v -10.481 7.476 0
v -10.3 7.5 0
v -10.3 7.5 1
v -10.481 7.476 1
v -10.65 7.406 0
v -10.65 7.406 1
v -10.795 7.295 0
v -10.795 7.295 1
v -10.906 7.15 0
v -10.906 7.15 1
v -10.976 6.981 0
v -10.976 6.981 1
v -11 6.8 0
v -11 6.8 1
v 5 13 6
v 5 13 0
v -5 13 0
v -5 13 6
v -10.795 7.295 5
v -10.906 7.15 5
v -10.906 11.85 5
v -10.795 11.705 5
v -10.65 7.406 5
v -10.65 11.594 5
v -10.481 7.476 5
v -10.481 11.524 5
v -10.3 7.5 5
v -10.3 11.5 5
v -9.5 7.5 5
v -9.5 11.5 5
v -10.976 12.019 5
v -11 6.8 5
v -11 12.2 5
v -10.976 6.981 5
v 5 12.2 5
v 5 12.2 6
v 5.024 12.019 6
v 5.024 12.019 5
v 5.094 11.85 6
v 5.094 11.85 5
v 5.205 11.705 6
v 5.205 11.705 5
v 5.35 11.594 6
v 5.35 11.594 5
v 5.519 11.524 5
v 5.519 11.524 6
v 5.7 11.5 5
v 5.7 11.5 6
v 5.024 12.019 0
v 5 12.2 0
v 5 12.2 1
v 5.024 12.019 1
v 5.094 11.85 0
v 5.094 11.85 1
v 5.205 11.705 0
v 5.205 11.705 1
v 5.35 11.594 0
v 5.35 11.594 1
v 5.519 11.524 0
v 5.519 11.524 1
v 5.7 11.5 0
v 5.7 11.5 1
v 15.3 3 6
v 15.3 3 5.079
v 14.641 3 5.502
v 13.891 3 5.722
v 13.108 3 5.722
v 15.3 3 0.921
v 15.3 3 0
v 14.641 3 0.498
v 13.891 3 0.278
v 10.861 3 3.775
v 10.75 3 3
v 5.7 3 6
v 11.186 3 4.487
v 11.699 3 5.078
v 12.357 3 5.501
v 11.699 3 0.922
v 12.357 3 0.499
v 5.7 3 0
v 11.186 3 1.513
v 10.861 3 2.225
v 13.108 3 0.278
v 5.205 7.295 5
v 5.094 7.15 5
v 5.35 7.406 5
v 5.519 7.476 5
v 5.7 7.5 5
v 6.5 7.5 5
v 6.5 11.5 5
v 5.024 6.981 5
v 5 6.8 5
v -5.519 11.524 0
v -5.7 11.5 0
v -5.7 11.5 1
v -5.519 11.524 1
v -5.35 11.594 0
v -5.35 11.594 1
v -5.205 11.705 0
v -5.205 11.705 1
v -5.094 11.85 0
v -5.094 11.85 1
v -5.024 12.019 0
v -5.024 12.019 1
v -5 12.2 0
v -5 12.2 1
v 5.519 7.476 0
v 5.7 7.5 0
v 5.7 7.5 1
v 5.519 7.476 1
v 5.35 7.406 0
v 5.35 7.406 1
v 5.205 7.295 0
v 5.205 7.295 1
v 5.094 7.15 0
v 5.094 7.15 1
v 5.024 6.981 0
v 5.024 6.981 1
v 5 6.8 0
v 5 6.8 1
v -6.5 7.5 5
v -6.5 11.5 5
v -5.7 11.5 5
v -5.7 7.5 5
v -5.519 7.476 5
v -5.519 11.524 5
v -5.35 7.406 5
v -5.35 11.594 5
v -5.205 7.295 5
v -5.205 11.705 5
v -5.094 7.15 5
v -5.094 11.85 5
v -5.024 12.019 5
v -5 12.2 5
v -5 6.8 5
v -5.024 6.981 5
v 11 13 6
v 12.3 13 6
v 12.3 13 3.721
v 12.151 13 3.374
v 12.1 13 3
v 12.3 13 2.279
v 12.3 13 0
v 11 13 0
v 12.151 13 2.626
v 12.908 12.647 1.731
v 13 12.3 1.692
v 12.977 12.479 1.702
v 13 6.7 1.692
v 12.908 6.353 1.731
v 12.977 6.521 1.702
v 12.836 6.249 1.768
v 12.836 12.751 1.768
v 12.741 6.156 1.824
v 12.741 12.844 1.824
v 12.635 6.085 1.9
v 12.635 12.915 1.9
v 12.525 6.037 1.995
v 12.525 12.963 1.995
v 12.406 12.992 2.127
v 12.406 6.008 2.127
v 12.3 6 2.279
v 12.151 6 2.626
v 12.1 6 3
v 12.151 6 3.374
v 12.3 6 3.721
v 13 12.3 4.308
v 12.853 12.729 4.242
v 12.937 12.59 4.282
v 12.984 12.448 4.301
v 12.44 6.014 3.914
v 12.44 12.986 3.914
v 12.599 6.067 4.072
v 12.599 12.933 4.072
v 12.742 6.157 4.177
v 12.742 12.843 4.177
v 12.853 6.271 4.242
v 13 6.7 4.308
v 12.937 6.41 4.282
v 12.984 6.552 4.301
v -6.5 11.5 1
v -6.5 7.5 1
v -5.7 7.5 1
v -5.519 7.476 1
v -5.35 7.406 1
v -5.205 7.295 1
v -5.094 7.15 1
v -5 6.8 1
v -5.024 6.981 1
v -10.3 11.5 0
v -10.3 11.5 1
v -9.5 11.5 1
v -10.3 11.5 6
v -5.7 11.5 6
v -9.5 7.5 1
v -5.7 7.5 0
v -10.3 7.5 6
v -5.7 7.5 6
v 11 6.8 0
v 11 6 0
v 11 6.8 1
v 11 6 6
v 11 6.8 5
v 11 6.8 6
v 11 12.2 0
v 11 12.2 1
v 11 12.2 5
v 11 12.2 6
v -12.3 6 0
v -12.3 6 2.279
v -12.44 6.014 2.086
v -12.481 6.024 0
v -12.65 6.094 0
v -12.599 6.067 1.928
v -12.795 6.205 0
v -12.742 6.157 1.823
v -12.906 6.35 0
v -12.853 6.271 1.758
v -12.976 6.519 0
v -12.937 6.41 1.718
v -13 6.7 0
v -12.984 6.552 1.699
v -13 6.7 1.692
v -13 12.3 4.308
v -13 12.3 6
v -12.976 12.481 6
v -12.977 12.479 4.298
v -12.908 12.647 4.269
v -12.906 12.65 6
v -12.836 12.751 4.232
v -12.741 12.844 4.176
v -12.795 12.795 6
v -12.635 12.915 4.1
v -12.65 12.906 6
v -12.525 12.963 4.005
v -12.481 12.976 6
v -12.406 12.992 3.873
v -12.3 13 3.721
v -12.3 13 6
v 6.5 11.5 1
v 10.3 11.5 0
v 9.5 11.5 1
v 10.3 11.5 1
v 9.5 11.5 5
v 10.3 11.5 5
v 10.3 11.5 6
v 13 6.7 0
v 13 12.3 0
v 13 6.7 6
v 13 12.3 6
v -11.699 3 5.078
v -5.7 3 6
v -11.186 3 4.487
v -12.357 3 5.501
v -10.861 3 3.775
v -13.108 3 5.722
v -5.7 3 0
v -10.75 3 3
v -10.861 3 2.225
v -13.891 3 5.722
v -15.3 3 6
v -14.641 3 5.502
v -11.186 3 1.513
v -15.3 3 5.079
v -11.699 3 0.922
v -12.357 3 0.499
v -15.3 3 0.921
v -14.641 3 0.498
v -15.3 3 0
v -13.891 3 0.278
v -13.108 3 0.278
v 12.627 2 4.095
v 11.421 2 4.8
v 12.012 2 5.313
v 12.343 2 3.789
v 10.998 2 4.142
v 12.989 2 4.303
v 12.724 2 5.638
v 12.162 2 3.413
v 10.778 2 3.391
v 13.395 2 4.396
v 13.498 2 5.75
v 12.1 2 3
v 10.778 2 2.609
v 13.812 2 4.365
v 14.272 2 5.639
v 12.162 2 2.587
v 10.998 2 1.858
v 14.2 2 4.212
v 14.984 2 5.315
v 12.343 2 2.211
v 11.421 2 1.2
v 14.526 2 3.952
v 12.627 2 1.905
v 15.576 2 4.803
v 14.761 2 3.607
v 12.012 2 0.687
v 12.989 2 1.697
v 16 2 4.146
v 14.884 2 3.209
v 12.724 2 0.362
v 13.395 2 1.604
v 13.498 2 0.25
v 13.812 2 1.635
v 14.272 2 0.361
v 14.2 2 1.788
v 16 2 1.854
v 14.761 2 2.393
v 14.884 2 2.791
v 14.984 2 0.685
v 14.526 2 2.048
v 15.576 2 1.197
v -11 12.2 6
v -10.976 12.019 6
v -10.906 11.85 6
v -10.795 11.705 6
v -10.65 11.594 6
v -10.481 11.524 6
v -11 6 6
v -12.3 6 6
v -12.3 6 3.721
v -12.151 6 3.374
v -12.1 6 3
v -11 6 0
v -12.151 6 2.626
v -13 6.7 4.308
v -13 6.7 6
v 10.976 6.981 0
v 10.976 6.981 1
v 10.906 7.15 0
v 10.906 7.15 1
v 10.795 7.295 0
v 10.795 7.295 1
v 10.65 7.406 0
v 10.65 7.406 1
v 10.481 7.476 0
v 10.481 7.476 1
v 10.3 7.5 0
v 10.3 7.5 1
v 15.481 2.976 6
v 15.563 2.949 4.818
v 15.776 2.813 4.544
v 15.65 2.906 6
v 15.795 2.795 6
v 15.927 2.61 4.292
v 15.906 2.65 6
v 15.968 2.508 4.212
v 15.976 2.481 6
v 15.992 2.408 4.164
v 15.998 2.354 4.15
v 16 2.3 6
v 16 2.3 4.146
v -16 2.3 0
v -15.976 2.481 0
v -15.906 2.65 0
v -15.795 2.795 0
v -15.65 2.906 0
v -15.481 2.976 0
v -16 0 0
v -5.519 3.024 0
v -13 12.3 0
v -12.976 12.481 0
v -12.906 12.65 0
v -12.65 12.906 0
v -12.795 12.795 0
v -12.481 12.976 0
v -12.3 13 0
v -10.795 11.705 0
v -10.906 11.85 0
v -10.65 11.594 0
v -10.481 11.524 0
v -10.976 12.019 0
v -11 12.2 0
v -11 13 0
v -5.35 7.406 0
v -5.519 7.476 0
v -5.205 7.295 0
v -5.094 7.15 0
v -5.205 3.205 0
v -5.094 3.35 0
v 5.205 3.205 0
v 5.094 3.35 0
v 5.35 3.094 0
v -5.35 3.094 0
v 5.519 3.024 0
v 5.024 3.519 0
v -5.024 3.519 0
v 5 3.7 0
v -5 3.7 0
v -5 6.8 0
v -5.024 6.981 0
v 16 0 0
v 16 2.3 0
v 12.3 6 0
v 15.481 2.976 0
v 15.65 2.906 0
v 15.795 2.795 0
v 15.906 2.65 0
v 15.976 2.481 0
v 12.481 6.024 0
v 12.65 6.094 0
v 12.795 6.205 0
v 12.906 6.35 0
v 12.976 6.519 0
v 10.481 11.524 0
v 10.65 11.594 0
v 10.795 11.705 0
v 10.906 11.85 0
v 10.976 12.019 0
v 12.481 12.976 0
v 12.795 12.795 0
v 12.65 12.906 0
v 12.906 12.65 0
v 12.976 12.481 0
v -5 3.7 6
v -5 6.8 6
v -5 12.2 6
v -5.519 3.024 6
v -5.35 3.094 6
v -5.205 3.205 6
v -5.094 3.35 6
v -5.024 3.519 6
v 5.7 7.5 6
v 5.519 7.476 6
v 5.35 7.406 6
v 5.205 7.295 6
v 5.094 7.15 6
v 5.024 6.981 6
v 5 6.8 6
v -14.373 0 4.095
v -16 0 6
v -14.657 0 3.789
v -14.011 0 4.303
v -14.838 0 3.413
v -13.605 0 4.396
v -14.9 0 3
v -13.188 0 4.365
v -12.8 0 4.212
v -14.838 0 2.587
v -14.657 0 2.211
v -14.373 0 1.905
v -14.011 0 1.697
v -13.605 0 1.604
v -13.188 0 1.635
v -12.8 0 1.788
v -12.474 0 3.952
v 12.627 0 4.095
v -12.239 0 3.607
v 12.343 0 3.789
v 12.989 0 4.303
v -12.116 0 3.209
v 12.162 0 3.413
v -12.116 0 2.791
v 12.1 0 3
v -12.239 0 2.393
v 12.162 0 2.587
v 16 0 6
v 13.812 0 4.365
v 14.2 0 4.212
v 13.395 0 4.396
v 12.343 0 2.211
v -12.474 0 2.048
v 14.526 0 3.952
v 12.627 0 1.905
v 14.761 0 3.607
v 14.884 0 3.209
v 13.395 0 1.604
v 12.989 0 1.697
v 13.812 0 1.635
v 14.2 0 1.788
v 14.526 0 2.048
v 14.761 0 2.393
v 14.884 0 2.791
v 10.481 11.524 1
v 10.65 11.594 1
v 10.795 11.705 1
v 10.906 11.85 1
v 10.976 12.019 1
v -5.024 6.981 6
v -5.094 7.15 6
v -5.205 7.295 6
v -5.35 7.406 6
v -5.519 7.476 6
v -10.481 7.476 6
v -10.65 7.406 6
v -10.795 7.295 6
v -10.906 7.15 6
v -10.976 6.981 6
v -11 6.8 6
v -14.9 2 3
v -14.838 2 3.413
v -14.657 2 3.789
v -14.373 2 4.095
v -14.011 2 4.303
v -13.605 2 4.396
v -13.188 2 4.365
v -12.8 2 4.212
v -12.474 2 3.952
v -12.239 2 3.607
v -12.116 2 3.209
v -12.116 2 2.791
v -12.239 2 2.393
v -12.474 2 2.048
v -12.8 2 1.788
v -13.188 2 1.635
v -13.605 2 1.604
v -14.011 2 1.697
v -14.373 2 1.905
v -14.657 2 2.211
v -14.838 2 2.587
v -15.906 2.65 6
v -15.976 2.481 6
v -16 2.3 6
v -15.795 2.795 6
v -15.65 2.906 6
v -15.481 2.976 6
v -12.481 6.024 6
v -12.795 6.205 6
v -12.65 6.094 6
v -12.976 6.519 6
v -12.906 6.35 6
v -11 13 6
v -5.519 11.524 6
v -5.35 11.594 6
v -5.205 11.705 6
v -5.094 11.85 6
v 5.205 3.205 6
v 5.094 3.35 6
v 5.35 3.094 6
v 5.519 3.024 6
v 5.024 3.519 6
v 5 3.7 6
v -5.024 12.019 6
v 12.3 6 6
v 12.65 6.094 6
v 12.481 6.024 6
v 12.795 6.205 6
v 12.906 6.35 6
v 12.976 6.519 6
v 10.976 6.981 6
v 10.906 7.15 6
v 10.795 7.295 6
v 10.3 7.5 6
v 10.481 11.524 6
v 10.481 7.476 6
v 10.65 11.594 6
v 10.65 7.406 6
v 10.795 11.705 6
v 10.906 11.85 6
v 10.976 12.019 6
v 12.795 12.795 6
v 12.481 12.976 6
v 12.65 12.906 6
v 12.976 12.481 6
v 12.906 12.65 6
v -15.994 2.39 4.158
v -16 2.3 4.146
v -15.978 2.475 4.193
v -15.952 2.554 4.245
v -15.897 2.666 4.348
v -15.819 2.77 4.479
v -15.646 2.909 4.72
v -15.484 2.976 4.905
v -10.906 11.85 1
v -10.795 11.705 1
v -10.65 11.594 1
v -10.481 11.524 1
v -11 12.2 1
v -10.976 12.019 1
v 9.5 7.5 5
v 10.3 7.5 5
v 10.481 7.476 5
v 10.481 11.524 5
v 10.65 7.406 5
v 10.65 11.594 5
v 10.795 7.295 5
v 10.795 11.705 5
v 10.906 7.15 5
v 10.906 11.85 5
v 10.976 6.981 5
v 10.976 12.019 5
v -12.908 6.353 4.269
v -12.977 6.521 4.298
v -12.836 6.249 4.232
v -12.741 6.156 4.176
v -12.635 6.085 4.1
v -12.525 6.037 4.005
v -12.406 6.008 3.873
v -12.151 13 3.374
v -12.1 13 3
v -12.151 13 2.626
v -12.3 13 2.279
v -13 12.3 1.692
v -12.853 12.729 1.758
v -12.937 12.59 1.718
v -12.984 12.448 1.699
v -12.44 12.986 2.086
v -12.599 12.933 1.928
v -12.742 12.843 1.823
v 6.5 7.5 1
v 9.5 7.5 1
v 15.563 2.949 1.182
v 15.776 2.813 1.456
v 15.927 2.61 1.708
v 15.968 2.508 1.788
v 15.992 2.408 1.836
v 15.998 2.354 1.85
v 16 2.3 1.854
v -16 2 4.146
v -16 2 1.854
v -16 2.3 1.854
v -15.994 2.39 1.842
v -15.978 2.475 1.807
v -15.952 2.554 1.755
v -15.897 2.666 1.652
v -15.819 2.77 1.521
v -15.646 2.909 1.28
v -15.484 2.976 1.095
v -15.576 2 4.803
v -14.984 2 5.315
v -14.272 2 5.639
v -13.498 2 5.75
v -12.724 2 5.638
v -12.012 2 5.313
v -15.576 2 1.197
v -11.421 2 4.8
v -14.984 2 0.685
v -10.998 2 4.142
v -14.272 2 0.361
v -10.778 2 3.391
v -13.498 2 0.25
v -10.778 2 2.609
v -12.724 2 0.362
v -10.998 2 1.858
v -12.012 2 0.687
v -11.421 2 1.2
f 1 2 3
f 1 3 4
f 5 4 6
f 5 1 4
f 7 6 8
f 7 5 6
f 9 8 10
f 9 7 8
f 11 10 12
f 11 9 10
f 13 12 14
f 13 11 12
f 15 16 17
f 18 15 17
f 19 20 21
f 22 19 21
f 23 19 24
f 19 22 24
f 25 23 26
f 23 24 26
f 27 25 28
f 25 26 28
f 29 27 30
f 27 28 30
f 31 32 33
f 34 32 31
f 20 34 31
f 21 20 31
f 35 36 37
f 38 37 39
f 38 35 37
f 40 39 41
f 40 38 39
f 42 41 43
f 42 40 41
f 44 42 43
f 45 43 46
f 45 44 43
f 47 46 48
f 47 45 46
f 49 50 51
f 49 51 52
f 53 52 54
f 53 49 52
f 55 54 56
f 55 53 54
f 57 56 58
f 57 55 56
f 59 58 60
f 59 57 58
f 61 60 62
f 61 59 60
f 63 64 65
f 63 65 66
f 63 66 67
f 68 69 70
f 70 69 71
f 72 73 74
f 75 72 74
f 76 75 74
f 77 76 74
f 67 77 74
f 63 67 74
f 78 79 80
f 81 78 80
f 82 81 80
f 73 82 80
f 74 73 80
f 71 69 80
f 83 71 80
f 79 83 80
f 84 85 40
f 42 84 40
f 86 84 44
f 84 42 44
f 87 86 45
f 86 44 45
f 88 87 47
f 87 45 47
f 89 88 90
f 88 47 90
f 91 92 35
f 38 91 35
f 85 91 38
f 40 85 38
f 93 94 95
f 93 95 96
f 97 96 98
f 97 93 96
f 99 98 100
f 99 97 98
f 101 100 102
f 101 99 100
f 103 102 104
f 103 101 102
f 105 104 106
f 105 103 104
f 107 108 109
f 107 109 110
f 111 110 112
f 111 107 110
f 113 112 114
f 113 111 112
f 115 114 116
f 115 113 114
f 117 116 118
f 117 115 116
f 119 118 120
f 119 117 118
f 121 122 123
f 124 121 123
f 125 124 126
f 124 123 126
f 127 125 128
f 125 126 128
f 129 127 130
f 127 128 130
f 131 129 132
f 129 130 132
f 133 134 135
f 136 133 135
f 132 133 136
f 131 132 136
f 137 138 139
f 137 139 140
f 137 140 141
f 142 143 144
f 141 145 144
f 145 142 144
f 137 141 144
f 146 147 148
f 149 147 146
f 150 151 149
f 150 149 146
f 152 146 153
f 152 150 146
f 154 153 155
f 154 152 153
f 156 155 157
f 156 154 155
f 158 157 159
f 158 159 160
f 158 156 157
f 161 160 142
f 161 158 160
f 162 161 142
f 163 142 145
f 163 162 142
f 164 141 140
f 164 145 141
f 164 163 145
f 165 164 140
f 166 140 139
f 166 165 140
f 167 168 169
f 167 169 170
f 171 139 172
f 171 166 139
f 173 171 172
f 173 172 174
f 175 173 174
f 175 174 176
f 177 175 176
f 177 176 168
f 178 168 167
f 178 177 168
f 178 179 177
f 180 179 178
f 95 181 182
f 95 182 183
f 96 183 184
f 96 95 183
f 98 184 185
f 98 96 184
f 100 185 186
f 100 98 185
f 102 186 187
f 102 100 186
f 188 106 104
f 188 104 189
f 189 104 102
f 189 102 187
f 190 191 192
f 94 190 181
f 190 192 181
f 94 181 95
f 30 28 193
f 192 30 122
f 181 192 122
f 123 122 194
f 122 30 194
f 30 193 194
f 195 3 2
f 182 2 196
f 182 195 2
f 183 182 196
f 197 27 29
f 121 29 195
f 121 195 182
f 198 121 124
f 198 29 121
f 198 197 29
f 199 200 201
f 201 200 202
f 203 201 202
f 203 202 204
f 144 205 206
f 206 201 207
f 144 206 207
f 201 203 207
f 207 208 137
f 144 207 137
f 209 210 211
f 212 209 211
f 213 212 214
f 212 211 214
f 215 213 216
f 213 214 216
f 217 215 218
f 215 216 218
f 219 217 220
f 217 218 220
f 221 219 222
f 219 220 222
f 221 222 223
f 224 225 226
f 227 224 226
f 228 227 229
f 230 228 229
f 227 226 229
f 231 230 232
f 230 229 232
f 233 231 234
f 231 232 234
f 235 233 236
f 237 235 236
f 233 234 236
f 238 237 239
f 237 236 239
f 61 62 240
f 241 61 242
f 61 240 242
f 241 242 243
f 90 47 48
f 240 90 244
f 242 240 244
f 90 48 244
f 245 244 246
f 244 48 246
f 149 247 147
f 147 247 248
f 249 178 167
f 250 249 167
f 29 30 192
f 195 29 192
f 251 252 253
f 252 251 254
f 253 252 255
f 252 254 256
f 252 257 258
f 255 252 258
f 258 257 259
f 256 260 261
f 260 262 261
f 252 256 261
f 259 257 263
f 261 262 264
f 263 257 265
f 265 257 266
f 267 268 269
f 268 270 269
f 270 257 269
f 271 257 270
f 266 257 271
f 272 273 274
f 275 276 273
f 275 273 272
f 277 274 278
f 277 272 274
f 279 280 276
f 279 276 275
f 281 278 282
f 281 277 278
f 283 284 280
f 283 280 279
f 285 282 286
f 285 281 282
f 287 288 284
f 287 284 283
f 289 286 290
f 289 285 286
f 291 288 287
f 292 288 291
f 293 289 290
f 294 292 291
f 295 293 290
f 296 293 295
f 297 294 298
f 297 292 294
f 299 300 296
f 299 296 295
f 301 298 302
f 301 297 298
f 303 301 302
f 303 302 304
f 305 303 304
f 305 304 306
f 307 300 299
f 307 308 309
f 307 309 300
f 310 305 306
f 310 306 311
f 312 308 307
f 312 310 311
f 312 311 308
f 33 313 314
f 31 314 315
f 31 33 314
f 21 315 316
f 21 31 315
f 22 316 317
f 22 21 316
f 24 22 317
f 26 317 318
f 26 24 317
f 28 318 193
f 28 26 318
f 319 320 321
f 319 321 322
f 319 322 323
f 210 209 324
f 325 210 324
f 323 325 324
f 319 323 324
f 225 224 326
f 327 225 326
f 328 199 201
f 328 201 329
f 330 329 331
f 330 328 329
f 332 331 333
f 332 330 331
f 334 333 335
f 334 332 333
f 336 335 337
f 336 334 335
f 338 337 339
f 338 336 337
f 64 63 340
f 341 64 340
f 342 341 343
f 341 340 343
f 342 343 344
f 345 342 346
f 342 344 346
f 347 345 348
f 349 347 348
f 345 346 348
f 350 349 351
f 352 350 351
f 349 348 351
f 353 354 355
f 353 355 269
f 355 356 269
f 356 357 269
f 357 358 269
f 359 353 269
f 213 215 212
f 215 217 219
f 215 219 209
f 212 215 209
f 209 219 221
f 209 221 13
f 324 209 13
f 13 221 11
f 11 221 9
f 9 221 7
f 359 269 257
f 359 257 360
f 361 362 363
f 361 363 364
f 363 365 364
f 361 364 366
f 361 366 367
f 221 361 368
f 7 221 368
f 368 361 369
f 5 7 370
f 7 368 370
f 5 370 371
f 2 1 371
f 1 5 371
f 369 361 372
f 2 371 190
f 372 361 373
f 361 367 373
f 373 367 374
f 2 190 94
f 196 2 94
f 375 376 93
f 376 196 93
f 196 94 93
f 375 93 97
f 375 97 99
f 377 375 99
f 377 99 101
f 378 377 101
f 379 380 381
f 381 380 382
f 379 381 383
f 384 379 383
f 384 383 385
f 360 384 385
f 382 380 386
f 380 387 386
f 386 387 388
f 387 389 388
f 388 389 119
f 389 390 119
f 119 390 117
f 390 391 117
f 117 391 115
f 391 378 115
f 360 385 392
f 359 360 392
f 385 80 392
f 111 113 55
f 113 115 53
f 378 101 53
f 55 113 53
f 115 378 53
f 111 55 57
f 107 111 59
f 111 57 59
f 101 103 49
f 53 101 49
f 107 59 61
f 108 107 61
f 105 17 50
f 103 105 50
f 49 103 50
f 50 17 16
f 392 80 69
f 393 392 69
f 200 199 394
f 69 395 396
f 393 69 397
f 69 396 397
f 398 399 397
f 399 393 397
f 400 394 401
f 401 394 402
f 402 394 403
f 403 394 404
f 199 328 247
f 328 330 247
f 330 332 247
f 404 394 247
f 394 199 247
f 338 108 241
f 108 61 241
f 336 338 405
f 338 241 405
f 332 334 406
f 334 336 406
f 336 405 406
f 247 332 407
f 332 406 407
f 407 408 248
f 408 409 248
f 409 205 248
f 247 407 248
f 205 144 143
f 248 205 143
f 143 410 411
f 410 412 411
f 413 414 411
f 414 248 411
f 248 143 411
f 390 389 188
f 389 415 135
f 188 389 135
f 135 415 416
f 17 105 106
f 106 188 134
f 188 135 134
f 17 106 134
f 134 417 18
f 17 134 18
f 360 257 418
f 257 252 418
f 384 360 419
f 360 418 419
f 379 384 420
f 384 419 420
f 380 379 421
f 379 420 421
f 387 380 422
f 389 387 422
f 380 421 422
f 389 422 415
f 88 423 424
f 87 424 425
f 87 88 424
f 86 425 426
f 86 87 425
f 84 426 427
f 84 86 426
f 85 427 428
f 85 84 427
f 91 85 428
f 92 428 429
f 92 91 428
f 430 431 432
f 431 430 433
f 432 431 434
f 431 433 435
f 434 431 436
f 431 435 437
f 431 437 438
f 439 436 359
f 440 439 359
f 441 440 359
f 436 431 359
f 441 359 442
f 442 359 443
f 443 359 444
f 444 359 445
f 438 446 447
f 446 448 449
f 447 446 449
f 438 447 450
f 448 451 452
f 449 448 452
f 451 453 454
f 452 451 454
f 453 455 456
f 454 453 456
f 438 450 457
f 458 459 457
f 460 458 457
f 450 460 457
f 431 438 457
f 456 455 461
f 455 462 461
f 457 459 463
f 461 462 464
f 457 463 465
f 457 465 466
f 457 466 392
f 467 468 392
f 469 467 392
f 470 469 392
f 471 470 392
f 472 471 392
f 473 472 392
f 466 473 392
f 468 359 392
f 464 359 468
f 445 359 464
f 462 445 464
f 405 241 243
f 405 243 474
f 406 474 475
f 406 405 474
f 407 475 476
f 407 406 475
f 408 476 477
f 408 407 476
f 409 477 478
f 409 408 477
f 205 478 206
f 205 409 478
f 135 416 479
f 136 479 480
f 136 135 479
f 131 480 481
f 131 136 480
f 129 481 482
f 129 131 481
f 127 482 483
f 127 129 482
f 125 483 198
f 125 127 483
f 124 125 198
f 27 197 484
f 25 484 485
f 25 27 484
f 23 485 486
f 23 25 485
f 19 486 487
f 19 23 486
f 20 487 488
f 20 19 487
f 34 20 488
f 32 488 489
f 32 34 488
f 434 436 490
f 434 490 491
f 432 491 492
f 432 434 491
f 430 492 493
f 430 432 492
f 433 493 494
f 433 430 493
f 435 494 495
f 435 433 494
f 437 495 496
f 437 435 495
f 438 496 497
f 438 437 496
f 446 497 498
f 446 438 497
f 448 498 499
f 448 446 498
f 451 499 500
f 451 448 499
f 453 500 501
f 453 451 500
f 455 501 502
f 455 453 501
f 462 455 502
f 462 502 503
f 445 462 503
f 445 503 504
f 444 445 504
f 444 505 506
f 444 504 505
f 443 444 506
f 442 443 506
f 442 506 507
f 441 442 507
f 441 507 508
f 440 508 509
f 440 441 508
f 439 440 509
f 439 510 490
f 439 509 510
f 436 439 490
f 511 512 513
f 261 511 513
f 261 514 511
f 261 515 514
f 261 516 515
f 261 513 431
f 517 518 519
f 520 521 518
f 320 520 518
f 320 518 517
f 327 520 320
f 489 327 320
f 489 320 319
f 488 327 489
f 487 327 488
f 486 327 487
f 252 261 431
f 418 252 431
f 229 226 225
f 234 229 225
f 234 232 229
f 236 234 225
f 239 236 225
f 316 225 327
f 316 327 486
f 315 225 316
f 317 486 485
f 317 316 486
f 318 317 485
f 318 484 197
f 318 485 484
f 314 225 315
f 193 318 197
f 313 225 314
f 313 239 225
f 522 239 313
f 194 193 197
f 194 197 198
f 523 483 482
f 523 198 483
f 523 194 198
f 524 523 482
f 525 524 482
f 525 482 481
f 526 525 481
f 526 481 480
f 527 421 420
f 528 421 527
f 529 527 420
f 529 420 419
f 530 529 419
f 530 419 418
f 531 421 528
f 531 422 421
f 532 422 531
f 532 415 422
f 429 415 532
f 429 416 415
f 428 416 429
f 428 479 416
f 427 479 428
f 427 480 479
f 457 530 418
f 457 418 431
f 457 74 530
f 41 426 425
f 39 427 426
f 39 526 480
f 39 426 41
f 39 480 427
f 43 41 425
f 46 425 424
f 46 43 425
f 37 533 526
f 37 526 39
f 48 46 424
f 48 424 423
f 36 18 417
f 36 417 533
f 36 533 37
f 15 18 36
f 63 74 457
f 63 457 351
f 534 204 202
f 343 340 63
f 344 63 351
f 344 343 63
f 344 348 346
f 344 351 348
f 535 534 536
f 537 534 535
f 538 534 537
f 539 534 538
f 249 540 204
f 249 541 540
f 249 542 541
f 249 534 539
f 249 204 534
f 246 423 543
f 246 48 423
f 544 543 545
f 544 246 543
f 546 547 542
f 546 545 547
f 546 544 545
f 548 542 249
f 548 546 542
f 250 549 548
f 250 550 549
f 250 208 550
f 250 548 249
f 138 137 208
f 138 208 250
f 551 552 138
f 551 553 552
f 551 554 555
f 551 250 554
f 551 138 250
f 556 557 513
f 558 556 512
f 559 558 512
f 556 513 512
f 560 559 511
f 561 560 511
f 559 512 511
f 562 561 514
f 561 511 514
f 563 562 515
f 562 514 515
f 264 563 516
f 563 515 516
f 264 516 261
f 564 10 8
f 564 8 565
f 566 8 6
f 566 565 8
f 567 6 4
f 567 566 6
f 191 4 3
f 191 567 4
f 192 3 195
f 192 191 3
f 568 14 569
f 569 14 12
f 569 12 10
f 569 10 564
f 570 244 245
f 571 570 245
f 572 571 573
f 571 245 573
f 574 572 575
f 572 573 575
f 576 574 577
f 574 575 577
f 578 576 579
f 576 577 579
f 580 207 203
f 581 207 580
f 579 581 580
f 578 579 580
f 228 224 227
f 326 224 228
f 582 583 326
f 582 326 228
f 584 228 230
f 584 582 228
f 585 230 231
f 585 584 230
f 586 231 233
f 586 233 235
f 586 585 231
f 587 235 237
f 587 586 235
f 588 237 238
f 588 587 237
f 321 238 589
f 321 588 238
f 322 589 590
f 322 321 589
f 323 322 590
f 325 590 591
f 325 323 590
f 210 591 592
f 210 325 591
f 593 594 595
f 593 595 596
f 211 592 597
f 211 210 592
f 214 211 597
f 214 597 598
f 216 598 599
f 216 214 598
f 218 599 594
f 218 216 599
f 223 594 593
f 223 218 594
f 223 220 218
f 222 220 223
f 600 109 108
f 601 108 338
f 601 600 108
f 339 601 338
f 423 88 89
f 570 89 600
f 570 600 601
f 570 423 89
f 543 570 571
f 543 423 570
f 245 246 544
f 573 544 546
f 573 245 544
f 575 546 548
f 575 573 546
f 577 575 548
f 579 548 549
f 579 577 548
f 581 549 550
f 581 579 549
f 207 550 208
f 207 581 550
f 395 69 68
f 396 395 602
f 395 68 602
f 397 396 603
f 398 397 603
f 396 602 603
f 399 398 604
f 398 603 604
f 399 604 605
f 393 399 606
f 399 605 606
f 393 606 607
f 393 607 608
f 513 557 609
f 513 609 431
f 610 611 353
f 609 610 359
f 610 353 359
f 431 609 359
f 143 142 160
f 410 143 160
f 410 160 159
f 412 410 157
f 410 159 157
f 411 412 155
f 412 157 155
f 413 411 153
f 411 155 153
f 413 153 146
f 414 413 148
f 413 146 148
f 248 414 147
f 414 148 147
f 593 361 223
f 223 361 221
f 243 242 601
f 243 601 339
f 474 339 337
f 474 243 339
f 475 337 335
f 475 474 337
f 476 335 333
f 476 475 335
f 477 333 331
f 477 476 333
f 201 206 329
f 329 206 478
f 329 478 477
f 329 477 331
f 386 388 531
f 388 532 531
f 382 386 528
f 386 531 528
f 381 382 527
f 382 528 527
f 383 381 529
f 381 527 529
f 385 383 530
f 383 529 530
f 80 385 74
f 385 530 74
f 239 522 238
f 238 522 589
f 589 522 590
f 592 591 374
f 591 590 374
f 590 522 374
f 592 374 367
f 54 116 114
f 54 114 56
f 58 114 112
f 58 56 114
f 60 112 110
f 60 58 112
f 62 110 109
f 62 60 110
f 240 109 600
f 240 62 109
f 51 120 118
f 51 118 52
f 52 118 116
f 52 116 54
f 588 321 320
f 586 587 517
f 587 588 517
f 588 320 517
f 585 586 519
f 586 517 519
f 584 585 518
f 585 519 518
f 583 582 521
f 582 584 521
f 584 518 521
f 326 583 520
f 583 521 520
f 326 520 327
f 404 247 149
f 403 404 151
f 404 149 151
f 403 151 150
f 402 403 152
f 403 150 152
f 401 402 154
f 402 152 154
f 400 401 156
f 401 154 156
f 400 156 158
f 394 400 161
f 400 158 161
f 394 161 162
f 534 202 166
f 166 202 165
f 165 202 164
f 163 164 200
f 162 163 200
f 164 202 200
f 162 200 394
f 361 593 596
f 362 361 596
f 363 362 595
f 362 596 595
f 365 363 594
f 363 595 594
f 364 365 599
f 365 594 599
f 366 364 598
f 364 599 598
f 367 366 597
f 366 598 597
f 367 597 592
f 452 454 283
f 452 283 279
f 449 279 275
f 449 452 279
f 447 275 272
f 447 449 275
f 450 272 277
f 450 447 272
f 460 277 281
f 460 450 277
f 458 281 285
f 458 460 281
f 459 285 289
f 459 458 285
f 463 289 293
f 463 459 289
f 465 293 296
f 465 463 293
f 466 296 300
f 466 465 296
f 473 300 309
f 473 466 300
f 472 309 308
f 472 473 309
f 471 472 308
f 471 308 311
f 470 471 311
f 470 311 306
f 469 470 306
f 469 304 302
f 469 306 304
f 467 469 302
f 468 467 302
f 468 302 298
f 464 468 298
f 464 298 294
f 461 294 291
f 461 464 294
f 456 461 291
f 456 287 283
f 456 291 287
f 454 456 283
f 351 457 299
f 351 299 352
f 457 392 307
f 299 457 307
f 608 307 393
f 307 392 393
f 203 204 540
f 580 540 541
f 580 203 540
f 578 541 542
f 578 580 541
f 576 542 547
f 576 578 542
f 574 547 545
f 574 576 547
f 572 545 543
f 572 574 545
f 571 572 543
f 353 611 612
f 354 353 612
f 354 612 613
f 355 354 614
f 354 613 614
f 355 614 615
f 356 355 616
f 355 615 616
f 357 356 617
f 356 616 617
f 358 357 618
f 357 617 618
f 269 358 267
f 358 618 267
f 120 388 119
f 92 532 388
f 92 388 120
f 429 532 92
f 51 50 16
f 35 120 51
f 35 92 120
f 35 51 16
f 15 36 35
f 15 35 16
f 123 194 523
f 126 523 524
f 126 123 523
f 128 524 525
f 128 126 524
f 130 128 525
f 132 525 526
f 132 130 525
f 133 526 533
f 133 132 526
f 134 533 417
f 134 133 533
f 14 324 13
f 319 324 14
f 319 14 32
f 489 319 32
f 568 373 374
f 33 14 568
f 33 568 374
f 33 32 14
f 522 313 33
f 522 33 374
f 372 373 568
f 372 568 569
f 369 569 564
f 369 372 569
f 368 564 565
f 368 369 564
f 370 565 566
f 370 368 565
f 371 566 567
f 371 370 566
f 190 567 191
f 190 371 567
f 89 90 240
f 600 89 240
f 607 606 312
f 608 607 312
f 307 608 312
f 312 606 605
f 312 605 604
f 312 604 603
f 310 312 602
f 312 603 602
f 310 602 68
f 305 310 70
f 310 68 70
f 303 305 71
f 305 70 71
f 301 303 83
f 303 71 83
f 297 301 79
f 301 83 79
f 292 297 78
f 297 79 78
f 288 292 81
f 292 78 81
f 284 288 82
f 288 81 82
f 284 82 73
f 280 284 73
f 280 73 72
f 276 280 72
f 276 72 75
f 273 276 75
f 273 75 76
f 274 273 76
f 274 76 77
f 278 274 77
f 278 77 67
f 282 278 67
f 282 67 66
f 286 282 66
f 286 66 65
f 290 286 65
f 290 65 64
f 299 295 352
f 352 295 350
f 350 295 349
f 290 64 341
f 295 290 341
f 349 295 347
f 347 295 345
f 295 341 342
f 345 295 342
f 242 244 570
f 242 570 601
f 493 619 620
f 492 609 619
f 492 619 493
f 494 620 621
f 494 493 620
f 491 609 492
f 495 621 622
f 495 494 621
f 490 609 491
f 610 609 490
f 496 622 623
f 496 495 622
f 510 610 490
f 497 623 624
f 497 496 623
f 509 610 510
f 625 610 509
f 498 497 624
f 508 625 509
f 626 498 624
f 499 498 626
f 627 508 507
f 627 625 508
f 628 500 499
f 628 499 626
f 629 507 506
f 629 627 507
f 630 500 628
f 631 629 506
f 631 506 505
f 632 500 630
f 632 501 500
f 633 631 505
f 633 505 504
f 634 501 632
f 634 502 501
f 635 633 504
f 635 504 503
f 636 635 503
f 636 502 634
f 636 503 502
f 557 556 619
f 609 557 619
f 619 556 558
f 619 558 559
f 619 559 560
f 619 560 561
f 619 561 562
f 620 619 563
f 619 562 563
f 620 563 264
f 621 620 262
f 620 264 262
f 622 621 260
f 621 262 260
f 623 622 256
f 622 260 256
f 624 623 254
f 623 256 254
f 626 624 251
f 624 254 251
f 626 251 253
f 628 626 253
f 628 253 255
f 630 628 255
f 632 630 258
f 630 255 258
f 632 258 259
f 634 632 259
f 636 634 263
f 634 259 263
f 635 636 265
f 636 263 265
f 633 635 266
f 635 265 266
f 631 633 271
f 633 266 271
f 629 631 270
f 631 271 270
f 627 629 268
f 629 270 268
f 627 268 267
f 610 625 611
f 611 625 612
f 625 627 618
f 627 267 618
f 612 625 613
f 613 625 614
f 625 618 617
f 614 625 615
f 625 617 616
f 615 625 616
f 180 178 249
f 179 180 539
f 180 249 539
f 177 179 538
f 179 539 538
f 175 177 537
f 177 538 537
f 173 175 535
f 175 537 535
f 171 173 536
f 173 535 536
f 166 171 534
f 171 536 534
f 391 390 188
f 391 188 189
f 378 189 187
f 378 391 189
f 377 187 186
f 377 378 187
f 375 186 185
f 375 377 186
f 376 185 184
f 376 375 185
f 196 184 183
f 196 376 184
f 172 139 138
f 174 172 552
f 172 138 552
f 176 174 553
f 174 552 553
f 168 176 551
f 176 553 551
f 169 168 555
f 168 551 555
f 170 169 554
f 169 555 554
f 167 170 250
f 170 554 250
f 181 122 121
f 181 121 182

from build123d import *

# Parameters (mm, degrees)
BOSS_EXTRUDE1_DEPTH     = 6
SKETCH4_W               = 6
SKETCH4_H               = 1.5
CUT_EXTRUDE2_DEPTH      = 22.470910554
FILLET1_R               = 0.7
CUT_EXTRUDE1_DEPTH      = 20.798989873
CUT_EXTRUDE1_DEPTH_BACK = 20.798989873
SKETCH2_R               = 1.4
CUT_EXTRUDE3_REACH      = 23.471
SKETCH5_W               = 1.5
SKETCH5_H               = 4
SKETCH6_R               = 2.75
CUT_EXTRUDE5_DEPTH      = 1


with BuildPart() as part:
    # Sketch1 → Boss-Extrude1 (new body)
    with BuildSketch(Plane.XY):
        Polygon((13, 13), (-13, 13), (-13, 6), (-5, 6), (-5, 3), (-16, 3), (-16, 0), (16, 0), (16, 3), (5, 3), (5, 6), (13, 6), align=None)
    extrude(amount=BOSS_EXTRUDE1_DEPTH)

    # Sketch4 → Cut-Extrude2 (cut, through all)
    with BuildSketch(Plane.XY.offset(6)):
        with Locations((-8, 6.75)):
            Rectangle(SKETCH4_W, SKETCH4_H)
        with Locations((-8, 12.25)):
            Rectangle(SKETCH4_W, SKETCH4_H)
        with Locations((8, 12.25)):
            Rectangle(SKETCH4_W, SKETCH4_H)
        with Locations((8, 6.75)):
            Rectangle(SKETCH4_W, SKETCH4_H)
    extrude(amount=-CUT_EXTRUDE2_DEPTH, mode=Mode.SUBTRACT)

    # Fillet1
    fillet1_edges = [part.edges().sort_by_distance(p)[0] for p in [
        (-13, 6, 3),
        (-13, 13, 3),
        (13, 13, 3),
        (13, 6, 3),
        (5, 3, 3),
        (16, 3, 3),
        (-16, 3, 3),
        (-5, 3, 3),
        (5, 7.5, 3),
        (11, 7.5, 3),
        (11, 11.5, 3),
        (5, 11.5, 3),
        (-11, 11.5, 3),
        (-5, 11.5, 3),
        (-11, 7.5, 3),
        (-5, 7.5, 3),
    ]]
    fillet(fillet1_edges, radius=FILLET1_R)

    # Sketch2 → Cut-Extrude1 (cut, two sides: drawn at the far end of the back side and taken through both)
    with BuildSketch(Plane(origin=(0, 3, 0), x_dir=(1, 0, 0), z_dir=(0, 1, 0)).offset(-CUT_EXTRUDE1_DEPTH_BACK)):
        with Locations(Location((-13.5, -3, 0), (0, 0, 180))):
            Circle(SKETCH2_R)
        with Locations(Location((13.5, -3, 0), (0, 0, 180))):
            Circle(SKETCH2_R)
    extrude(amount=CUT_EXTRUDE1_DEPTH + CUT_EXTRUDE1_DEPTH_BACK, mode=Mode.SUBTRACT)

    # Sketch5 → Cut-Extrude3 (cut, up to next)
    with BuildSketch(Plane(origin=(0, 13, 0), x_dir=(1, 0, 0), z_dir=(0, 1, 0)), mode=Mode.PRIVATE) as cut_extrude3_sk1:
        with Locations((-10.25, -3)):
            Rectangle(SKETCH5_W, SKETCH5_H)
    cut_extrude3_tool1 = extrude(cut_extrude3_sk1.sketch, amount=-CUT_EXTRUDE3_REACH, mode=Mode.PRIVATE) & part.part
    # Sketch5 → Cut-Extrude3 (cut, up to next)
    with BuildSketch(Plane(origin=(0, 13, 0), x_dir=(1, 0, 0), z_dir=(0, 1, 0)), mode=Mode.PRIVATE) as cut_extrude3_sk2:
        with Locations((-5.75, -3)):
            Rectangle(SKETCH5_W, SKETCH5_H)
    cut_extrude3_tool2 = extrude(cut_extrude3_sk2.sketch, amount=-CUT_EXTRUDE3_REACH, mode=Mode.PRIVATE) & part.part
    # Sketch5 → Cut-Extrude3 (cut, up to next)
    with BuildSketch(Plane(origin=(0, 13, 0), x_dir=(1, 0, 0), z_dir=(0, 1, 0)), mode=Mode.PRIVATE) as cut_extrude3_sk3:
        with Locations((5.75, -3)):
            Rectangle(SKETCH5_W, SKETCH5_H)
    cut_extrude3_tool3 = extrude(cut_extrude3_sk3.sketch, amount=-CUT_EXTRUDE3_REACH, mode=Mode.PRIVATE) & part.part
    # Sketch5 → Cut-Extrude3 (cut, up to next)
    with BuildSketch(Plane(origin=(0, 13, 0), x_dir=(1, 0, 0), z_dir=(0, 1, 0)), mode=Mode.PRIVATE) as cut_extrude3_sk4:
        with Locations((10.25, -3)):
            Rectangle(SKETCH5_W, SKETCH5_H)
    cut_extrude3_tool4 = extrude(cut_extrude3_sk4.sketch, amount=-CUT_EXTRUDE3_REACH, mode=Mode.PRIVATE) & part.part
    add(cut_extrude3_tool1.solids().sort_by_distance((-10.25, 13, 3))[0], mode=Mode.SUBTRACT)
    add(cut_extrude3_tool2.solids().sort_by_distance((-5.75, 13, 3))[0], mode=Mode.SUBTRACT)
    add(cut_extrude3_tool3.solids().sort_by_distance((5.75, 13, 3))[0], mode=Mode.SUBTRACT)
    add(cut_extrude3_tool4.solids().sort_by_distance((10.25, 13, 3))[0], mode=Mode.SUBTRACT)

    # Sketch6 → Cut-Extrude5 (cut)
    with BuildSketch(Plane(origin=(0, 3, 0), x_dir=(1, 0, 0), z_dir=(0, 1, 0))):
        with Locations((13.5, -3)):
            Circle(SKETCH6_R)
        with Locations((-13.5, -3)):
            Circle(SKETCH6_R)
    extrude(amount=-CUT_EXTRUDE5_DEPTH, mode=Mode.SUBTRACT)


solid = part.part
